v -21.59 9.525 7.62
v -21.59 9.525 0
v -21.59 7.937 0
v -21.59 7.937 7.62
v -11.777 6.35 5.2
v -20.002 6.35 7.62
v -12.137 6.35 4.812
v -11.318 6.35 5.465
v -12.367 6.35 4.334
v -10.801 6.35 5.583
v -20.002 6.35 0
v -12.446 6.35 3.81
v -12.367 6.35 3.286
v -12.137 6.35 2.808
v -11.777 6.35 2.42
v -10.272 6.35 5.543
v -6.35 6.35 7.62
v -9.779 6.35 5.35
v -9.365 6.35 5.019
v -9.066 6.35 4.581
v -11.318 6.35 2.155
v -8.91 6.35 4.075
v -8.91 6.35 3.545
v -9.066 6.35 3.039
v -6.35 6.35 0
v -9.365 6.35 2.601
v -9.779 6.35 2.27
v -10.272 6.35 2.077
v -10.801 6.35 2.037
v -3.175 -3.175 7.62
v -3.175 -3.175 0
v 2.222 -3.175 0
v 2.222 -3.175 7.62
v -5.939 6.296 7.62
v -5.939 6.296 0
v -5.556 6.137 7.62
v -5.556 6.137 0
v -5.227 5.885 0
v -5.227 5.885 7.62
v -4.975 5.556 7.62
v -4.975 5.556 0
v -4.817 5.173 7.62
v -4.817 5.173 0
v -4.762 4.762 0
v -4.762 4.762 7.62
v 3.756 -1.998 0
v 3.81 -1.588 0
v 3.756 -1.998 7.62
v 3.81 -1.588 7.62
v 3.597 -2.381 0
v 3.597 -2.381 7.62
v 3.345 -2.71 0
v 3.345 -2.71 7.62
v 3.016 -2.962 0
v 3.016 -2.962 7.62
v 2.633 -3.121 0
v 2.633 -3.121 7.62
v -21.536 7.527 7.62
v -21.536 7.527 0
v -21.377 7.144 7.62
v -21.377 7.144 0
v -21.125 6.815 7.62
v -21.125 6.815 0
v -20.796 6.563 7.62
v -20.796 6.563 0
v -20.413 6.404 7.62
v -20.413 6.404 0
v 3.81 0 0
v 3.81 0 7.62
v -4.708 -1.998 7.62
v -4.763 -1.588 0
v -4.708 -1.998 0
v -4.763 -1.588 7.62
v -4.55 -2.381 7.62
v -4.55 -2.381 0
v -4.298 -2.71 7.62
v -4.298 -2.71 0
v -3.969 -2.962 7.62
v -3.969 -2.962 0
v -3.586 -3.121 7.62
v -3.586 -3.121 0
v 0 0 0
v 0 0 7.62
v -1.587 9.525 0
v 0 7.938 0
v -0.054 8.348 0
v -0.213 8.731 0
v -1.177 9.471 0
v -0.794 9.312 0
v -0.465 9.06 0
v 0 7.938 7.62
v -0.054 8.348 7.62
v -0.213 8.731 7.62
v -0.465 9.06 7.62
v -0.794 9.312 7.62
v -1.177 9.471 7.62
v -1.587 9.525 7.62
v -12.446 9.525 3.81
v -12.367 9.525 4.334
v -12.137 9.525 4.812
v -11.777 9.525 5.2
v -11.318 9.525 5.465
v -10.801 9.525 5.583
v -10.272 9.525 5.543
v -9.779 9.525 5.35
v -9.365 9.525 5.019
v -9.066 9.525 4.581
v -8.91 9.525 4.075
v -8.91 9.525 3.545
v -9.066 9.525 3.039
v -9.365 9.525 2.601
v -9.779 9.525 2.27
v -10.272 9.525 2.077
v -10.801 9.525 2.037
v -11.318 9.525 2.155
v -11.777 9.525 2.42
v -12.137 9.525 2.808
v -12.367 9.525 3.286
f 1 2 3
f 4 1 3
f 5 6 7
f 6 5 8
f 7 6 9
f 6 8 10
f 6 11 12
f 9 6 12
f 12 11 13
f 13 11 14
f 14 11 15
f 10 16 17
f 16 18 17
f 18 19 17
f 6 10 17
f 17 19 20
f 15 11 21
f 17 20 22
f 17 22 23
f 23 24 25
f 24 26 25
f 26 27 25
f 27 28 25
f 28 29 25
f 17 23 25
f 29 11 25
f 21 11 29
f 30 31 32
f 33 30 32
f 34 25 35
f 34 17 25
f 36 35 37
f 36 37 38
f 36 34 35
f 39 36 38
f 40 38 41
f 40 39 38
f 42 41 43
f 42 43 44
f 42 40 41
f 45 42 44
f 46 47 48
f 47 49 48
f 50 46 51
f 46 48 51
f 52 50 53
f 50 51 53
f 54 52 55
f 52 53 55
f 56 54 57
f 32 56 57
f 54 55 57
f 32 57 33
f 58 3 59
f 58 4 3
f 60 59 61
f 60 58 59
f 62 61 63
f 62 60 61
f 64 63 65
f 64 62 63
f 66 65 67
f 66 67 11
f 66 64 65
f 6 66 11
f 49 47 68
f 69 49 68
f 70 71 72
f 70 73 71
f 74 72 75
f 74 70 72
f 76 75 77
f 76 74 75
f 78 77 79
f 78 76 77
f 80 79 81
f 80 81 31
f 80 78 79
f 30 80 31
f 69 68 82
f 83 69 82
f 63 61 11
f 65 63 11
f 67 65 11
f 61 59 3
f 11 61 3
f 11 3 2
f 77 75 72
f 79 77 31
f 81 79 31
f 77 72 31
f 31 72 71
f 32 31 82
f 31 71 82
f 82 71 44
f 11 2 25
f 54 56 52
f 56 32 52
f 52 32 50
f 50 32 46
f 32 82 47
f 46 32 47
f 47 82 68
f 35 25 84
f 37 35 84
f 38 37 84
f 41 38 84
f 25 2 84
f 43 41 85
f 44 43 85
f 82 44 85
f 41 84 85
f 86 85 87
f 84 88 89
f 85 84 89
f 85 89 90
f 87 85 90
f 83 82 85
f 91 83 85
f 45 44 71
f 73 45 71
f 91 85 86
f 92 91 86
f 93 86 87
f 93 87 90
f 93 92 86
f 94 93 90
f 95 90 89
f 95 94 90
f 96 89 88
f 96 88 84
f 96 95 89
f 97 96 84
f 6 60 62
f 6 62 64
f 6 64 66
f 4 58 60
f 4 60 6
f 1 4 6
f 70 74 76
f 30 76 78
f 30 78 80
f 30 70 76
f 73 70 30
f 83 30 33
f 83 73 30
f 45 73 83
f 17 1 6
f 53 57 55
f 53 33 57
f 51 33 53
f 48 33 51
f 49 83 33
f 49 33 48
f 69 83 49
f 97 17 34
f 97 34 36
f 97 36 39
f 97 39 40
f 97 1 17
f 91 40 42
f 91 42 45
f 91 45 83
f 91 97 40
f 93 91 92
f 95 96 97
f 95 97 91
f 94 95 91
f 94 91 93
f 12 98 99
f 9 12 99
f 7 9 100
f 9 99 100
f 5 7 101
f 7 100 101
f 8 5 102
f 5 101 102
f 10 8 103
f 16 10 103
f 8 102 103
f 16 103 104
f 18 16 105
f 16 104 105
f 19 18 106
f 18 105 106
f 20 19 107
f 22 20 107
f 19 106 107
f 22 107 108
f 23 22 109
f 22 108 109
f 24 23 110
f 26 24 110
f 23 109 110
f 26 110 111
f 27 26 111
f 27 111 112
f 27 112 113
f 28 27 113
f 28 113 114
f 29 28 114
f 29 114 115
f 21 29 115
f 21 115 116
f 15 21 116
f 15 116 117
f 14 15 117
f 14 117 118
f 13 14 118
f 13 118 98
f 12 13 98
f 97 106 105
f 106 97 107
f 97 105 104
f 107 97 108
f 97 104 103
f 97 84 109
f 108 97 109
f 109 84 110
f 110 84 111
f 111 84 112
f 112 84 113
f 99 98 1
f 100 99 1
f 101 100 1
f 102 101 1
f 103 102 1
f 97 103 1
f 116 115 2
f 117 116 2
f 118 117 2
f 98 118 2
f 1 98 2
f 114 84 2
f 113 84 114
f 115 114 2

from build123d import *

# Parameters (mm, degrees)
BOSS_EXTRUDE1_DEPTH = 7.62
SKETCH2_R           = 1.778
CUT_EXTRUDE1_DEPTH  = 27.181720723
FILLET1_R           = 1.5875


with BuildPart() as part:
    # Sketch1 → Boss-Extrude1 (new body)
    with BuildSketch(Plane.XY):
        Polygon((0, 0), (0, 9.525), (-21.59, 9.525), (-21.59, 6.35), (-4.7625, 6.35), (-4.7625, -3.175), (3.81, -3.175), (3.81, 0), align=None)
    extrude(amount=BOSS_EXTRUDE1_DEPTH)

    # Sketch2 → Cut-Extrude1 (cut, through all)
    with BuildSketch(Plane(origin=(0, 9.525, 0), x_dir=(1, 0, 0), z_dir=(0, 1, 0))):
        with Locations(Location((-10.668, -3.81, 0), (0, 0, 180))):
            Circle(SKETCH2_R)
    extrude(amount=-CUT_EXTRUDE1_DEPTH, mode=Mode.SUBTRACT)

    # Fillet1
    fillet1_edges = [part.edges().sort_by_distance(p)[0] for p in [
        (-4.7625, -3.175, 3.81),
        (-4.7625, 6.35, 3.81),
        (-21.59, 6.35, 3.81),
        (0, 9.525, 3.81),
        (3.81, -3.175, 3.81),
    ]]
    fillet(fillet1_edges, radius=FILLET1_R)


solid = part.part
